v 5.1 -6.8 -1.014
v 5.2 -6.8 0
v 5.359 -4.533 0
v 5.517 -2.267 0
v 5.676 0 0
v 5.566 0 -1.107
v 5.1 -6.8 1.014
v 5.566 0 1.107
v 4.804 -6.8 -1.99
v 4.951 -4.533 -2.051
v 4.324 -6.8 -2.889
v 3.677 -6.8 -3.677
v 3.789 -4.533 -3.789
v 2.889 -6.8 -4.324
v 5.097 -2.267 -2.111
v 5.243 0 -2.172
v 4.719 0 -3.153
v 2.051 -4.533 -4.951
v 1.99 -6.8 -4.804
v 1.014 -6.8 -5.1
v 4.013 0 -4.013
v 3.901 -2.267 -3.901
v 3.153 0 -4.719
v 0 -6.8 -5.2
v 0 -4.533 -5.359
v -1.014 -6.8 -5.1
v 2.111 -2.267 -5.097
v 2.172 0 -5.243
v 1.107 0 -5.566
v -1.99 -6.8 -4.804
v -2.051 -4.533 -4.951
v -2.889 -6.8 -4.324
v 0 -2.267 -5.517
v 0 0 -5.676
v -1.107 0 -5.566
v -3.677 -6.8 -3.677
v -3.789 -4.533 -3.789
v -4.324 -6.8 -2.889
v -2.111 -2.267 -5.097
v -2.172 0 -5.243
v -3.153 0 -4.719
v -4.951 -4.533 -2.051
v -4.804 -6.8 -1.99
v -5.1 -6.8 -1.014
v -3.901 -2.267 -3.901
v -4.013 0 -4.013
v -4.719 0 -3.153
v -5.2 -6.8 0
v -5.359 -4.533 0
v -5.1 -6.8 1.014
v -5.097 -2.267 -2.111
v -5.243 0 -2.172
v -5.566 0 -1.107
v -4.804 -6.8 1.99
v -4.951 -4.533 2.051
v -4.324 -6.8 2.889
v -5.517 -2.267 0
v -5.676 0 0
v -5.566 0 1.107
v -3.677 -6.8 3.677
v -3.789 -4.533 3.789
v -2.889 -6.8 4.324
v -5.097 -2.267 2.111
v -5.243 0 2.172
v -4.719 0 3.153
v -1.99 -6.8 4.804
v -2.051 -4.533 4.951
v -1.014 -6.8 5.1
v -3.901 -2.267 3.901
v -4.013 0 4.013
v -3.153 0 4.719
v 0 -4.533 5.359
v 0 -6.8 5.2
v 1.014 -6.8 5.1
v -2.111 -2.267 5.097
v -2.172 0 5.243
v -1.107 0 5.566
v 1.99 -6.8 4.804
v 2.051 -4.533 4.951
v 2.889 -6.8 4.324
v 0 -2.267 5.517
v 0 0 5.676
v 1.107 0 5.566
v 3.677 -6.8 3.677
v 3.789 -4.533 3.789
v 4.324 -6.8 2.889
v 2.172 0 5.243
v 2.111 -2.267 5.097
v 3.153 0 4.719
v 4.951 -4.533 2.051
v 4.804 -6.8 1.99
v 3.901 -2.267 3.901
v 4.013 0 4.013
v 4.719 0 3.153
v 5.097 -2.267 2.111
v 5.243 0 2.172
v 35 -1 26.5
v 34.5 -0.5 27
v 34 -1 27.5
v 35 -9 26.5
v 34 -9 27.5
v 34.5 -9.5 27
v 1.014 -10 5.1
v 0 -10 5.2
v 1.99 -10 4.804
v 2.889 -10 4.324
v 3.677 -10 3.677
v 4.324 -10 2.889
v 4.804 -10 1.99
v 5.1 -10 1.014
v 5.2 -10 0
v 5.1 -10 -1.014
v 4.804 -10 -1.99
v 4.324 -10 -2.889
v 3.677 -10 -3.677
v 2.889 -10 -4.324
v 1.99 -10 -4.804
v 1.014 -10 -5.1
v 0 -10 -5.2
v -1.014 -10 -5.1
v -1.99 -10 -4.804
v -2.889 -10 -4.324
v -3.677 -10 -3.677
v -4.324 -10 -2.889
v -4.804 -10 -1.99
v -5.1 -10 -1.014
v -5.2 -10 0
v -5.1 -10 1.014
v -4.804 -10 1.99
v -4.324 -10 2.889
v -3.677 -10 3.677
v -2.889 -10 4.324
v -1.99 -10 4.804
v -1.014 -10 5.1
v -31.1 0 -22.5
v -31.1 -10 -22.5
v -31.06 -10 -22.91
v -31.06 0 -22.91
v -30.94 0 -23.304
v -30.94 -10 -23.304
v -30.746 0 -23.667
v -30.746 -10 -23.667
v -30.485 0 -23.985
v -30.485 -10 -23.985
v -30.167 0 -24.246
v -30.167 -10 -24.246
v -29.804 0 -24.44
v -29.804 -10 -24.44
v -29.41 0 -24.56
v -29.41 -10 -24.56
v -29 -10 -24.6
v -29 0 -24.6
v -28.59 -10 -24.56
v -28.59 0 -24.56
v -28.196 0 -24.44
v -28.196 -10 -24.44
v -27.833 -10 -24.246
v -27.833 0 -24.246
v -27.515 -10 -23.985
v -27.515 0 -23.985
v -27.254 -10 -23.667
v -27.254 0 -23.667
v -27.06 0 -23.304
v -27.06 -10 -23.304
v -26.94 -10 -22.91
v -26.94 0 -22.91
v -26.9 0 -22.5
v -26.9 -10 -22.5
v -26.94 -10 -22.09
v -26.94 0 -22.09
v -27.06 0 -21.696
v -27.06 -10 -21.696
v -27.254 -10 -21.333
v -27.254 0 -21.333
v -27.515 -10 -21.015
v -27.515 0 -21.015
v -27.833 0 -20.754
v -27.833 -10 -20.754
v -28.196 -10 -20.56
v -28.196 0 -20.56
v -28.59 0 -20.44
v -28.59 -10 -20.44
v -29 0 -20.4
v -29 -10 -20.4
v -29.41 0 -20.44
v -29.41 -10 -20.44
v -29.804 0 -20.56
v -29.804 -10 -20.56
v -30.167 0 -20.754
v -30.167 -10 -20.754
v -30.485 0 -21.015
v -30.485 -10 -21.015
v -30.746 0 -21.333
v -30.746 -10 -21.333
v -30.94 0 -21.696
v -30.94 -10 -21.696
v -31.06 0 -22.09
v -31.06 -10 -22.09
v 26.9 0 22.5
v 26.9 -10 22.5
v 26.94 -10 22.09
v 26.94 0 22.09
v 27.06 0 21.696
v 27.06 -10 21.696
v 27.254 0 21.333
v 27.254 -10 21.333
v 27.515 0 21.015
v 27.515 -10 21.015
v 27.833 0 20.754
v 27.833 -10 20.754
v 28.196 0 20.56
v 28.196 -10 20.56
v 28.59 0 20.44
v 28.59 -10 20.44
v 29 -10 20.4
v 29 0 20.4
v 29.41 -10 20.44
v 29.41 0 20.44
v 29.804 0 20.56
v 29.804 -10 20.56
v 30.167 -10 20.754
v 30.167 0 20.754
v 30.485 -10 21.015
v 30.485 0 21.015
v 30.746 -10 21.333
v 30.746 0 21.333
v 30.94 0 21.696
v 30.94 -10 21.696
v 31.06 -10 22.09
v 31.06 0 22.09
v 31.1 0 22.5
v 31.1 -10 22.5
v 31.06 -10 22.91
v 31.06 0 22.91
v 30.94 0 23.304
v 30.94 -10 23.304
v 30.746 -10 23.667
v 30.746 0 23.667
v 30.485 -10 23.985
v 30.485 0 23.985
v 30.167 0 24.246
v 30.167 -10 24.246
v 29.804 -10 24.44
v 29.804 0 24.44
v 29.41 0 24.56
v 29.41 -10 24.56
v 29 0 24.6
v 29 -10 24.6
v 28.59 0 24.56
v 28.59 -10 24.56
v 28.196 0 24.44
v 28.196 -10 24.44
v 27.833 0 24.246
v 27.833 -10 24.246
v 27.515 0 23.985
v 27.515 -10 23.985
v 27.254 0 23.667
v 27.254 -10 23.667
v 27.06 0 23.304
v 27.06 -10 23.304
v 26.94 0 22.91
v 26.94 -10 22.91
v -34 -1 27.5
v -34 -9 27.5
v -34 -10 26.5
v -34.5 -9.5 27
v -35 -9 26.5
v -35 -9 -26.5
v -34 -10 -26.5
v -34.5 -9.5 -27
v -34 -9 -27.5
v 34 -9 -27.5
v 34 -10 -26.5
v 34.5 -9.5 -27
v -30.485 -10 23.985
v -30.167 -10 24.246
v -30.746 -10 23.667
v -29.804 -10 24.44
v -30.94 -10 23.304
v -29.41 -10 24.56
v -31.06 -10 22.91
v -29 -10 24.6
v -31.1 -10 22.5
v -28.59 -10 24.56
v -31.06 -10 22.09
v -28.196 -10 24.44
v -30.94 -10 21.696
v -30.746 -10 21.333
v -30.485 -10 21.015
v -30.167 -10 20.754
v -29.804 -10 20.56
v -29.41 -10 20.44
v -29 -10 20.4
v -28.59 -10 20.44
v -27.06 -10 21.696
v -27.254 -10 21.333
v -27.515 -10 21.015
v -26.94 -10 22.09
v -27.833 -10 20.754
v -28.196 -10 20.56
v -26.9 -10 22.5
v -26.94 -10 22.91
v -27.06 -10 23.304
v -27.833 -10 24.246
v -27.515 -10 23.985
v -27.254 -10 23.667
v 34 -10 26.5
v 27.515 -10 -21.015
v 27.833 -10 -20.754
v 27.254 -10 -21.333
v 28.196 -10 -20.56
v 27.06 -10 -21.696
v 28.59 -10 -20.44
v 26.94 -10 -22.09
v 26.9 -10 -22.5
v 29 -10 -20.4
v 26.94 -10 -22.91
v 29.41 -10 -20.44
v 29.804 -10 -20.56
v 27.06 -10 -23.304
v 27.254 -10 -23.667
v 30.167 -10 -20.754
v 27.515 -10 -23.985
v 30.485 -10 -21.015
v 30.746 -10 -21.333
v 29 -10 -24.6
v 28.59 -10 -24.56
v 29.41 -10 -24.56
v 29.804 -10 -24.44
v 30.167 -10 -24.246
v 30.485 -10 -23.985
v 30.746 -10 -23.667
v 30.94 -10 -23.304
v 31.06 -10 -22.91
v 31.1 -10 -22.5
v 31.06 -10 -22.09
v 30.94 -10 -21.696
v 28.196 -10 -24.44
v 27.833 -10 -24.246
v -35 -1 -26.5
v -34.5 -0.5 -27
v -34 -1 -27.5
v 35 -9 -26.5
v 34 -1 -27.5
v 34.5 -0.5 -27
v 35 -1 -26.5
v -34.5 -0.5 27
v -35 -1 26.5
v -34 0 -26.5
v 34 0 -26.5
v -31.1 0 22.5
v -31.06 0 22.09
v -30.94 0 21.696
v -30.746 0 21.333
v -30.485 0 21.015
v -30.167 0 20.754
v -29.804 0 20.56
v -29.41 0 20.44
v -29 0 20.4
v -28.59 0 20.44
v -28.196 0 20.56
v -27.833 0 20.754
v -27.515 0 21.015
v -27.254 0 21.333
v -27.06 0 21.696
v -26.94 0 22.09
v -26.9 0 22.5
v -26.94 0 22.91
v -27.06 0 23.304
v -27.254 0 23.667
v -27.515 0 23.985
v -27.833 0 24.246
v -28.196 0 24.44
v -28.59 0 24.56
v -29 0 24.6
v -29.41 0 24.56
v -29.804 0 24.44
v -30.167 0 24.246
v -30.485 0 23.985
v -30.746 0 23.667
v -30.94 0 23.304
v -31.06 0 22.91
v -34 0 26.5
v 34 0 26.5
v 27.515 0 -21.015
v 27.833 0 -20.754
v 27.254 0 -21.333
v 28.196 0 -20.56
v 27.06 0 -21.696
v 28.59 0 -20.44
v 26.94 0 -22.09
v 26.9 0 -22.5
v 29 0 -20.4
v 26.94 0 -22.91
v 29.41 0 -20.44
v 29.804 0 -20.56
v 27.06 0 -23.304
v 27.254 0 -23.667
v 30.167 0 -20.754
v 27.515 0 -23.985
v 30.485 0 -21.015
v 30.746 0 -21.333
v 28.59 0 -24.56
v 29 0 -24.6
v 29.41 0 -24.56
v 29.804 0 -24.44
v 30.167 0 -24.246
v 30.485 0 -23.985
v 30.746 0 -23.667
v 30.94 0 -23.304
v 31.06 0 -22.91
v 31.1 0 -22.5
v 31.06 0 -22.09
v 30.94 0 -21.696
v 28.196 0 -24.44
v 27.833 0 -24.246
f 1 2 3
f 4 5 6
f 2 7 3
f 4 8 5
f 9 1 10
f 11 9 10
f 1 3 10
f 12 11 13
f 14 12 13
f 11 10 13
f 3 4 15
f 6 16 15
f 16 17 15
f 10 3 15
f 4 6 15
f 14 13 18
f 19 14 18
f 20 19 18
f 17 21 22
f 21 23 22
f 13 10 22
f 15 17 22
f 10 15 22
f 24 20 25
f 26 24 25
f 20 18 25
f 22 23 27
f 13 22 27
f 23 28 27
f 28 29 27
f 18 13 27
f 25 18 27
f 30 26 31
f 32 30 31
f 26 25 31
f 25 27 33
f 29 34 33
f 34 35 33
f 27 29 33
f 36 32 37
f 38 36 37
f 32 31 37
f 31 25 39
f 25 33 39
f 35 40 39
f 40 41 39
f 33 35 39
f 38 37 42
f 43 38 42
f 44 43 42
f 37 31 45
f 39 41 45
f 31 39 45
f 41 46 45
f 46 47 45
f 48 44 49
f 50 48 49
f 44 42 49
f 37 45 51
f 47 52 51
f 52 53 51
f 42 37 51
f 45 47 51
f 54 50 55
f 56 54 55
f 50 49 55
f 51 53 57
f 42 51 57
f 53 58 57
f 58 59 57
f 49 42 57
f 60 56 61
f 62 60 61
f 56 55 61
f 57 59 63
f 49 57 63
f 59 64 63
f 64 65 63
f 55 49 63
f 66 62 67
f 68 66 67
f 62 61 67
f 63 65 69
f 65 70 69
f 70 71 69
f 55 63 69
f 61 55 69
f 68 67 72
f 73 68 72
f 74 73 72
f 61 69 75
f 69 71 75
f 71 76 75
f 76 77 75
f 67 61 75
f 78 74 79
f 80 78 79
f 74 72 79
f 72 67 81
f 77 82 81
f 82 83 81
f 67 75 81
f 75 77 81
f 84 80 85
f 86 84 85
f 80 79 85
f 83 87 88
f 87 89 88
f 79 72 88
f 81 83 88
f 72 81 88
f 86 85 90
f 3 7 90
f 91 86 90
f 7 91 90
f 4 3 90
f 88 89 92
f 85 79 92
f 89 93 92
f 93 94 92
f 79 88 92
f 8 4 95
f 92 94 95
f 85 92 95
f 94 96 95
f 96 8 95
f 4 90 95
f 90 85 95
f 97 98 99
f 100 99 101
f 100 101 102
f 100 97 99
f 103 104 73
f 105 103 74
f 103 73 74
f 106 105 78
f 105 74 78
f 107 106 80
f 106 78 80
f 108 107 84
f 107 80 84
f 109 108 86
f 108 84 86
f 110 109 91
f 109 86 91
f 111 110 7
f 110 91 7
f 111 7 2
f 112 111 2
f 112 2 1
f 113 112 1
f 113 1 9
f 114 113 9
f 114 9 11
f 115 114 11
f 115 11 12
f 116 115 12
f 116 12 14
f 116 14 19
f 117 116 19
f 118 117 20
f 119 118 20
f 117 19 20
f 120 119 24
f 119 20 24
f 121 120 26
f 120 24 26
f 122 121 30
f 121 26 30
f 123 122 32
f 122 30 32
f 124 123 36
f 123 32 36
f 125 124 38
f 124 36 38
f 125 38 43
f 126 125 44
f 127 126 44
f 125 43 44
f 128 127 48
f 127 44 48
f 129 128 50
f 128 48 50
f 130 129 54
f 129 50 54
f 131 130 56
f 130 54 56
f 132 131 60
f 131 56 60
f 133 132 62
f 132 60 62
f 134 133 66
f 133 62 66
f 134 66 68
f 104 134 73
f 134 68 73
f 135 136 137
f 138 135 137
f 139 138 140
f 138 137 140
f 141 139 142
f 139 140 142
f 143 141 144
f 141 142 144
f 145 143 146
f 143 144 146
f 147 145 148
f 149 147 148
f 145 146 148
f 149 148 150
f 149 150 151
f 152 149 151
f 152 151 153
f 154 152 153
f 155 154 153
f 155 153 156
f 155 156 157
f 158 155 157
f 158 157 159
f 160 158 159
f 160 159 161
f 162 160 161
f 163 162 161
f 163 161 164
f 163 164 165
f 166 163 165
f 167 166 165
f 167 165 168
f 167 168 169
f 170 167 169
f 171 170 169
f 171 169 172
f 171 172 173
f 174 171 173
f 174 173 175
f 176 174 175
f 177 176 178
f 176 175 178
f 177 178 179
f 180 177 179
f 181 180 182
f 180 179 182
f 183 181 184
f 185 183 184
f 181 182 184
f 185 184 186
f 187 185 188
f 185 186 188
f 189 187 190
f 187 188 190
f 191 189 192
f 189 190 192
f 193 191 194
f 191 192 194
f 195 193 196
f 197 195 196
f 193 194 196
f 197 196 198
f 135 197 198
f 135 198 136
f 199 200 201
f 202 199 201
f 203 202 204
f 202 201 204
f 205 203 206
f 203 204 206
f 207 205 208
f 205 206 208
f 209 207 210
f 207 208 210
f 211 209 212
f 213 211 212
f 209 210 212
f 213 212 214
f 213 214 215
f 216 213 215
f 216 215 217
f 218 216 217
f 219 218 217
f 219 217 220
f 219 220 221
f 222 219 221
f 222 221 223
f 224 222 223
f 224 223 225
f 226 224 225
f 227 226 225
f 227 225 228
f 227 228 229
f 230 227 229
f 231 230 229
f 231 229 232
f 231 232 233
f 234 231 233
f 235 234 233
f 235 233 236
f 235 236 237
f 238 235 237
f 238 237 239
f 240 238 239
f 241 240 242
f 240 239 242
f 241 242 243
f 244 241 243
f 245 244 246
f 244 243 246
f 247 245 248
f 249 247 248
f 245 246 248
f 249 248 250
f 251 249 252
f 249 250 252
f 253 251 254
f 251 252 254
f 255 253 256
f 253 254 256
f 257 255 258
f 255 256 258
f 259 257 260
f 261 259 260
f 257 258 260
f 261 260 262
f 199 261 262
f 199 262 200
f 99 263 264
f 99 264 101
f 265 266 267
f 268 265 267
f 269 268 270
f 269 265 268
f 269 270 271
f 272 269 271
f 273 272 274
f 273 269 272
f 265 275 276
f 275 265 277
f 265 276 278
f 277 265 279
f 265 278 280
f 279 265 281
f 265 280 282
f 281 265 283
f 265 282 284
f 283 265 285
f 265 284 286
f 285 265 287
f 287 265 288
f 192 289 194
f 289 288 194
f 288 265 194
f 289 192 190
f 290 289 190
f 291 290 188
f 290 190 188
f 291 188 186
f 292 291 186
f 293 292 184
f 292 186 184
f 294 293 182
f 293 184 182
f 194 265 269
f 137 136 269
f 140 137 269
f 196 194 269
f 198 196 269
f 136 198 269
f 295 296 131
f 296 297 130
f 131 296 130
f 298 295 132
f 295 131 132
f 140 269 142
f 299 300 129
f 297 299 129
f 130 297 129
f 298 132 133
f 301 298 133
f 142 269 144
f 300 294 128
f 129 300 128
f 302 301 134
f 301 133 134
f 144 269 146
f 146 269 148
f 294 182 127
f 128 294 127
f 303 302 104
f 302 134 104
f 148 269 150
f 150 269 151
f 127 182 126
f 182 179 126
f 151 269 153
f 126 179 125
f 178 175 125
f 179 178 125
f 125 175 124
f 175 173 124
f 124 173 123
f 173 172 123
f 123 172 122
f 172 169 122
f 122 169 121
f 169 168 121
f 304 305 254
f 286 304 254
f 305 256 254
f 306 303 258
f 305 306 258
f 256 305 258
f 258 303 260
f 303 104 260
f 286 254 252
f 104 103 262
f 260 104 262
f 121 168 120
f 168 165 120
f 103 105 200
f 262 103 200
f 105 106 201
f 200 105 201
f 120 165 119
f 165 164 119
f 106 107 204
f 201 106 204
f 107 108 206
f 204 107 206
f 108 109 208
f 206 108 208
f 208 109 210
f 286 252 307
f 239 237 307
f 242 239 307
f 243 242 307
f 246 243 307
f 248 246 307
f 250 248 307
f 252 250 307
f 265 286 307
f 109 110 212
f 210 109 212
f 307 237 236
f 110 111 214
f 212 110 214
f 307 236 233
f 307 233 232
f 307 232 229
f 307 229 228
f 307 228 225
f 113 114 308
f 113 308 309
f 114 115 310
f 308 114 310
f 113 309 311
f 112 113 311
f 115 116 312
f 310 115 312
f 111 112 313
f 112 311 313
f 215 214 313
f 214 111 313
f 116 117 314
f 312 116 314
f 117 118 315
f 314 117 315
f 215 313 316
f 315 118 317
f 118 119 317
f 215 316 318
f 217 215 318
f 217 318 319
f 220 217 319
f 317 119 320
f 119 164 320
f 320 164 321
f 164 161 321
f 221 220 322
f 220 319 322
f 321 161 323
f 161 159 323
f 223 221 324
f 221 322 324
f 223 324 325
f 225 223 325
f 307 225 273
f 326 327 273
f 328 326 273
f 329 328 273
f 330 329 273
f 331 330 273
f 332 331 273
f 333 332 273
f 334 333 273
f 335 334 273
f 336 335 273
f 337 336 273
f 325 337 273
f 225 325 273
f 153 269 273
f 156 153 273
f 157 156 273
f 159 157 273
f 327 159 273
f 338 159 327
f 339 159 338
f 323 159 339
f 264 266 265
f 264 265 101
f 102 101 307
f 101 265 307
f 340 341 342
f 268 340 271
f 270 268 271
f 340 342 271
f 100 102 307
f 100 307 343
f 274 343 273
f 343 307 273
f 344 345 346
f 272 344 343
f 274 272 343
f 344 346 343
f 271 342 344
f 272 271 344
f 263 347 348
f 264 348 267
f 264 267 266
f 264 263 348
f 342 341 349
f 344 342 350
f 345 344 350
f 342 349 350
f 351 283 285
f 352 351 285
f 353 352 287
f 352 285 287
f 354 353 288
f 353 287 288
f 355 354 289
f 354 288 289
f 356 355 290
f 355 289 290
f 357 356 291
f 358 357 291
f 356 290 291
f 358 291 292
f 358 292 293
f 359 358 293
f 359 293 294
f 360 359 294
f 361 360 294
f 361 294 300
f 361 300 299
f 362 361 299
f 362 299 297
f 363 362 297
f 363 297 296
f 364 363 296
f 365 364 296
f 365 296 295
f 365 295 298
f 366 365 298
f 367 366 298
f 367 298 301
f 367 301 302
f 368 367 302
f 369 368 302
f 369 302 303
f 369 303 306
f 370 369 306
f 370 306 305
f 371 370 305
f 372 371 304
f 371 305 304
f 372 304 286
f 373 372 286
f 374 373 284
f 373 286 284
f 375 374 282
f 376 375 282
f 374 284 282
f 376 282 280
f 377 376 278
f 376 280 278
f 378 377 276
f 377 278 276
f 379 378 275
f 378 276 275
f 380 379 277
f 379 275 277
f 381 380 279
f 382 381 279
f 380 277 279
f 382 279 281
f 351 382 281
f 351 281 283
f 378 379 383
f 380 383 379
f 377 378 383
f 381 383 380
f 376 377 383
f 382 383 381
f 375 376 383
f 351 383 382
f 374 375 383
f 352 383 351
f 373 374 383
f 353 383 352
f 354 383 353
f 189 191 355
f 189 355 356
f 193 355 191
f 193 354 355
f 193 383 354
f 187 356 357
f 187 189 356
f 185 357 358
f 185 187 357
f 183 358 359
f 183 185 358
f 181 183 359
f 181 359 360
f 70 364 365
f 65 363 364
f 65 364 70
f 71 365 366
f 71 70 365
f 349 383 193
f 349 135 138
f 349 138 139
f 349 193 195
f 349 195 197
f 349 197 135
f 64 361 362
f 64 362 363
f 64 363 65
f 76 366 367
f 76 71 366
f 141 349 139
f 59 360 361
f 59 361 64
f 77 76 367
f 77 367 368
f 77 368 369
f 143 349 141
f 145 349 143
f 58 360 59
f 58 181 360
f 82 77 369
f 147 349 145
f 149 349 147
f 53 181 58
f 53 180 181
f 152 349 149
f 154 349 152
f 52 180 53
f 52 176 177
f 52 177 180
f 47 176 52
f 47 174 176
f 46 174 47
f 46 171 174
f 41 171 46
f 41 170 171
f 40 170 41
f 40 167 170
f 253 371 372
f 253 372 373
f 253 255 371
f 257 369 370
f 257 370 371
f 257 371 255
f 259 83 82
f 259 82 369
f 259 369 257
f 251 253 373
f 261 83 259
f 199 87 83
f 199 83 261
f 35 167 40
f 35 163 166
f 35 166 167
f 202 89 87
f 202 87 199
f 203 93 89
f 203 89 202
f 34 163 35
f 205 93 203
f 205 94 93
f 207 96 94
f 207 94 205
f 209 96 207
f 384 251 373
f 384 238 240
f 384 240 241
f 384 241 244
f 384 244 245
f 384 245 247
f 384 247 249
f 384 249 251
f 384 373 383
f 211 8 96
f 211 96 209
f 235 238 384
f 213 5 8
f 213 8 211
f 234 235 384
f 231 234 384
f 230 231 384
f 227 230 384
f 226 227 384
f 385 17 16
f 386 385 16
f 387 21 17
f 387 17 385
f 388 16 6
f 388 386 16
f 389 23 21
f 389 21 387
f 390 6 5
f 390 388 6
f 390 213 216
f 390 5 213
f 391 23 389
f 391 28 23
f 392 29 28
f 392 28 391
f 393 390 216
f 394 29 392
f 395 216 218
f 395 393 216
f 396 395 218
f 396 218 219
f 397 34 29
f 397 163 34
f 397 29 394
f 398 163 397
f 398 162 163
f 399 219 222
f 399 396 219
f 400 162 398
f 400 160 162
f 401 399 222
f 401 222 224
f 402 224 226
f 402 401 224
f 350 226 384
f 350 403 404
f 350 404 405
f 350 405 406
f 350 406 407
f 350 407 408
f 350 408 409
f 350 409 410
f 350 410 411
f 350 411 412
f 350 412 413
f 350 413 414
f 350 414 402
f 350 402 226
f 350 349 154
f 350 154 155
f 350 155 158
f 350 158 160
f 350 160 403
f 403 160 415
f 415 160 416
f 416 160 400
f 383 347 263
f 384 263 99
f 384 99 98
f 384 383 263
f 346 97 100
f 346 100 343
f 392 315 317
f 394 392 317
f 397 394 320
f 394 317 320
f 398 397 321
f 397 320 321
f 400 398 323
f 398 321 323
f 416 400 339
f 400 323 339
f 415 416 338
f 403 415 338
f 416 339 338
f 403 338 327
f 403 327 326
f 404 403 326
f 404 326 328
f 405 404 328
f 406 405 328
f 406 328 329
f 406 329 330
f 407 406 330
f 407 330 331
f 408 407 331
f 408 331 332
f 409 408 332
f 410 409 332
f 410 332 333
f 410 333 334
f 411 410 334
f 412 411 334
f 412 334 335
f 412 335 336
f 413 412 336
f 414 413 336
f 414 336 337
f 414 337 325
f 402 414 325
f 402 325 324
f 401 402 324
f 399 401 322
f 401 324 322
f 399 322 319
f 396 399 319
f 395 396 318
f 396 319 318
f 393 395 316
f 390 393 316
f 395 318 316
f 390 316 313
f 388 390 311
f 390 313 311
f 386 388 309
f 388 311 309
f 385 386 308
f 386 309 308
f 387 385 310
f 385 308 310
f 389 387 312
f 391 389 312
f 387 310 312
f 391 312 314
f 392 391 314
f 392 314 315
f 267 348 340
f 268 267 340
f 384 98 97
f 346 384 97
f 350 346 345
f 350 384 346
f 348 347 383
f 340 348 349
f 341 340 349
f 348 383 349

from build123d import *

# Parameters (mm, degrees)
SKETCH1_W           = 70
SKETCH1_H           = 55
BOSS_EXTRUDE1_DEPTH = 10
CHAMFER1_SIZE       = 1
SKETCH2_R           = 5.2
CUT_EXTRUDE1_DEPTH  = 46.620718977
CHAMFER2_SIZE       = 1
M5_TAPPED_HOLE1_D   = 4.2


# Read off the part's stored shape, not the designer's step: Draft1
with BuildPart() as part:
    # Sketch1 → Boss-Extrude1 (new body)
    with BuildSketch(Plane(origin=(0, 0, 0), x_dir=(1, 0, 0), z_dir=(0, 1, 0))):
        Rectangle(SKETCH1_W, SKETCH1_H)
    extrude(amount=-BOSS_EXTRUDE1_DEPTH)

    # Chamfer1
    chamfer1_edges = [part.edges().sort_by_distance(p)[0] for p in [
        (-35, -10, 0),
        (0, -10, 27.5),
        (35, -10, 0),
        (0, 0, 27.5),
        (-35, 0, 0),
        (0, 0, -27.5),
        (35, 0, 0),
        (0, -10, -27.5),
    ]]
    chamfer(chamfer1_edges, length=CHAMFER1_SIZE)

    # Sketch2 → Cut-Extrude1 (cut, through all)
    with BuildSketch(Plane(origin=(0, 0, 0), x_dir=(1, 0, 0), z_dir=(0, 1, 0))):
        with Locations(Location((0, 0, 0), (0, 0, 270))):
            Circle(SKETCH2_R)
    extrude(amount=-CUT_EXTRUDE1_DEPTH, mode=Mode.SUBTRACT)

    # Chamfer2
    chamfer2_edges = [part.edges().sort_by_distance(p)[0] for p in [
        (35, -5, -27.5),
        (-35, -5, -27.5),
        (-35, -5, 27.5),
        (35, -5, 27.5),
    ]]
    chamfer(chamfer2_edges, length=CHAMFER2_SIZE)

    # M5 Tapped Hole1 (through all)
    with Locations(Plane(origin=(0, 0, 0), x_dir=(1, 0, 0), z_dir=(0, 1, 0))):
        with Locations((-29, 22.5), (29, 22.5), (29, -22.5), (-29, -22.5)):
            Hole(M5_TAPPED_HOLE1_D / 2)

    # Draft1 outline → Draft1 (revolve, cut)
    with BuildSketch(Plane.XY):
        Polygon((5.2, 0), (5.2, -6.8), (5.675502321, 0), align=None)
    revolve(axis=Axis((0, 0, 0), (0, 1, 0)), mode=Mode.SUBTRACT)


solid = part.part
